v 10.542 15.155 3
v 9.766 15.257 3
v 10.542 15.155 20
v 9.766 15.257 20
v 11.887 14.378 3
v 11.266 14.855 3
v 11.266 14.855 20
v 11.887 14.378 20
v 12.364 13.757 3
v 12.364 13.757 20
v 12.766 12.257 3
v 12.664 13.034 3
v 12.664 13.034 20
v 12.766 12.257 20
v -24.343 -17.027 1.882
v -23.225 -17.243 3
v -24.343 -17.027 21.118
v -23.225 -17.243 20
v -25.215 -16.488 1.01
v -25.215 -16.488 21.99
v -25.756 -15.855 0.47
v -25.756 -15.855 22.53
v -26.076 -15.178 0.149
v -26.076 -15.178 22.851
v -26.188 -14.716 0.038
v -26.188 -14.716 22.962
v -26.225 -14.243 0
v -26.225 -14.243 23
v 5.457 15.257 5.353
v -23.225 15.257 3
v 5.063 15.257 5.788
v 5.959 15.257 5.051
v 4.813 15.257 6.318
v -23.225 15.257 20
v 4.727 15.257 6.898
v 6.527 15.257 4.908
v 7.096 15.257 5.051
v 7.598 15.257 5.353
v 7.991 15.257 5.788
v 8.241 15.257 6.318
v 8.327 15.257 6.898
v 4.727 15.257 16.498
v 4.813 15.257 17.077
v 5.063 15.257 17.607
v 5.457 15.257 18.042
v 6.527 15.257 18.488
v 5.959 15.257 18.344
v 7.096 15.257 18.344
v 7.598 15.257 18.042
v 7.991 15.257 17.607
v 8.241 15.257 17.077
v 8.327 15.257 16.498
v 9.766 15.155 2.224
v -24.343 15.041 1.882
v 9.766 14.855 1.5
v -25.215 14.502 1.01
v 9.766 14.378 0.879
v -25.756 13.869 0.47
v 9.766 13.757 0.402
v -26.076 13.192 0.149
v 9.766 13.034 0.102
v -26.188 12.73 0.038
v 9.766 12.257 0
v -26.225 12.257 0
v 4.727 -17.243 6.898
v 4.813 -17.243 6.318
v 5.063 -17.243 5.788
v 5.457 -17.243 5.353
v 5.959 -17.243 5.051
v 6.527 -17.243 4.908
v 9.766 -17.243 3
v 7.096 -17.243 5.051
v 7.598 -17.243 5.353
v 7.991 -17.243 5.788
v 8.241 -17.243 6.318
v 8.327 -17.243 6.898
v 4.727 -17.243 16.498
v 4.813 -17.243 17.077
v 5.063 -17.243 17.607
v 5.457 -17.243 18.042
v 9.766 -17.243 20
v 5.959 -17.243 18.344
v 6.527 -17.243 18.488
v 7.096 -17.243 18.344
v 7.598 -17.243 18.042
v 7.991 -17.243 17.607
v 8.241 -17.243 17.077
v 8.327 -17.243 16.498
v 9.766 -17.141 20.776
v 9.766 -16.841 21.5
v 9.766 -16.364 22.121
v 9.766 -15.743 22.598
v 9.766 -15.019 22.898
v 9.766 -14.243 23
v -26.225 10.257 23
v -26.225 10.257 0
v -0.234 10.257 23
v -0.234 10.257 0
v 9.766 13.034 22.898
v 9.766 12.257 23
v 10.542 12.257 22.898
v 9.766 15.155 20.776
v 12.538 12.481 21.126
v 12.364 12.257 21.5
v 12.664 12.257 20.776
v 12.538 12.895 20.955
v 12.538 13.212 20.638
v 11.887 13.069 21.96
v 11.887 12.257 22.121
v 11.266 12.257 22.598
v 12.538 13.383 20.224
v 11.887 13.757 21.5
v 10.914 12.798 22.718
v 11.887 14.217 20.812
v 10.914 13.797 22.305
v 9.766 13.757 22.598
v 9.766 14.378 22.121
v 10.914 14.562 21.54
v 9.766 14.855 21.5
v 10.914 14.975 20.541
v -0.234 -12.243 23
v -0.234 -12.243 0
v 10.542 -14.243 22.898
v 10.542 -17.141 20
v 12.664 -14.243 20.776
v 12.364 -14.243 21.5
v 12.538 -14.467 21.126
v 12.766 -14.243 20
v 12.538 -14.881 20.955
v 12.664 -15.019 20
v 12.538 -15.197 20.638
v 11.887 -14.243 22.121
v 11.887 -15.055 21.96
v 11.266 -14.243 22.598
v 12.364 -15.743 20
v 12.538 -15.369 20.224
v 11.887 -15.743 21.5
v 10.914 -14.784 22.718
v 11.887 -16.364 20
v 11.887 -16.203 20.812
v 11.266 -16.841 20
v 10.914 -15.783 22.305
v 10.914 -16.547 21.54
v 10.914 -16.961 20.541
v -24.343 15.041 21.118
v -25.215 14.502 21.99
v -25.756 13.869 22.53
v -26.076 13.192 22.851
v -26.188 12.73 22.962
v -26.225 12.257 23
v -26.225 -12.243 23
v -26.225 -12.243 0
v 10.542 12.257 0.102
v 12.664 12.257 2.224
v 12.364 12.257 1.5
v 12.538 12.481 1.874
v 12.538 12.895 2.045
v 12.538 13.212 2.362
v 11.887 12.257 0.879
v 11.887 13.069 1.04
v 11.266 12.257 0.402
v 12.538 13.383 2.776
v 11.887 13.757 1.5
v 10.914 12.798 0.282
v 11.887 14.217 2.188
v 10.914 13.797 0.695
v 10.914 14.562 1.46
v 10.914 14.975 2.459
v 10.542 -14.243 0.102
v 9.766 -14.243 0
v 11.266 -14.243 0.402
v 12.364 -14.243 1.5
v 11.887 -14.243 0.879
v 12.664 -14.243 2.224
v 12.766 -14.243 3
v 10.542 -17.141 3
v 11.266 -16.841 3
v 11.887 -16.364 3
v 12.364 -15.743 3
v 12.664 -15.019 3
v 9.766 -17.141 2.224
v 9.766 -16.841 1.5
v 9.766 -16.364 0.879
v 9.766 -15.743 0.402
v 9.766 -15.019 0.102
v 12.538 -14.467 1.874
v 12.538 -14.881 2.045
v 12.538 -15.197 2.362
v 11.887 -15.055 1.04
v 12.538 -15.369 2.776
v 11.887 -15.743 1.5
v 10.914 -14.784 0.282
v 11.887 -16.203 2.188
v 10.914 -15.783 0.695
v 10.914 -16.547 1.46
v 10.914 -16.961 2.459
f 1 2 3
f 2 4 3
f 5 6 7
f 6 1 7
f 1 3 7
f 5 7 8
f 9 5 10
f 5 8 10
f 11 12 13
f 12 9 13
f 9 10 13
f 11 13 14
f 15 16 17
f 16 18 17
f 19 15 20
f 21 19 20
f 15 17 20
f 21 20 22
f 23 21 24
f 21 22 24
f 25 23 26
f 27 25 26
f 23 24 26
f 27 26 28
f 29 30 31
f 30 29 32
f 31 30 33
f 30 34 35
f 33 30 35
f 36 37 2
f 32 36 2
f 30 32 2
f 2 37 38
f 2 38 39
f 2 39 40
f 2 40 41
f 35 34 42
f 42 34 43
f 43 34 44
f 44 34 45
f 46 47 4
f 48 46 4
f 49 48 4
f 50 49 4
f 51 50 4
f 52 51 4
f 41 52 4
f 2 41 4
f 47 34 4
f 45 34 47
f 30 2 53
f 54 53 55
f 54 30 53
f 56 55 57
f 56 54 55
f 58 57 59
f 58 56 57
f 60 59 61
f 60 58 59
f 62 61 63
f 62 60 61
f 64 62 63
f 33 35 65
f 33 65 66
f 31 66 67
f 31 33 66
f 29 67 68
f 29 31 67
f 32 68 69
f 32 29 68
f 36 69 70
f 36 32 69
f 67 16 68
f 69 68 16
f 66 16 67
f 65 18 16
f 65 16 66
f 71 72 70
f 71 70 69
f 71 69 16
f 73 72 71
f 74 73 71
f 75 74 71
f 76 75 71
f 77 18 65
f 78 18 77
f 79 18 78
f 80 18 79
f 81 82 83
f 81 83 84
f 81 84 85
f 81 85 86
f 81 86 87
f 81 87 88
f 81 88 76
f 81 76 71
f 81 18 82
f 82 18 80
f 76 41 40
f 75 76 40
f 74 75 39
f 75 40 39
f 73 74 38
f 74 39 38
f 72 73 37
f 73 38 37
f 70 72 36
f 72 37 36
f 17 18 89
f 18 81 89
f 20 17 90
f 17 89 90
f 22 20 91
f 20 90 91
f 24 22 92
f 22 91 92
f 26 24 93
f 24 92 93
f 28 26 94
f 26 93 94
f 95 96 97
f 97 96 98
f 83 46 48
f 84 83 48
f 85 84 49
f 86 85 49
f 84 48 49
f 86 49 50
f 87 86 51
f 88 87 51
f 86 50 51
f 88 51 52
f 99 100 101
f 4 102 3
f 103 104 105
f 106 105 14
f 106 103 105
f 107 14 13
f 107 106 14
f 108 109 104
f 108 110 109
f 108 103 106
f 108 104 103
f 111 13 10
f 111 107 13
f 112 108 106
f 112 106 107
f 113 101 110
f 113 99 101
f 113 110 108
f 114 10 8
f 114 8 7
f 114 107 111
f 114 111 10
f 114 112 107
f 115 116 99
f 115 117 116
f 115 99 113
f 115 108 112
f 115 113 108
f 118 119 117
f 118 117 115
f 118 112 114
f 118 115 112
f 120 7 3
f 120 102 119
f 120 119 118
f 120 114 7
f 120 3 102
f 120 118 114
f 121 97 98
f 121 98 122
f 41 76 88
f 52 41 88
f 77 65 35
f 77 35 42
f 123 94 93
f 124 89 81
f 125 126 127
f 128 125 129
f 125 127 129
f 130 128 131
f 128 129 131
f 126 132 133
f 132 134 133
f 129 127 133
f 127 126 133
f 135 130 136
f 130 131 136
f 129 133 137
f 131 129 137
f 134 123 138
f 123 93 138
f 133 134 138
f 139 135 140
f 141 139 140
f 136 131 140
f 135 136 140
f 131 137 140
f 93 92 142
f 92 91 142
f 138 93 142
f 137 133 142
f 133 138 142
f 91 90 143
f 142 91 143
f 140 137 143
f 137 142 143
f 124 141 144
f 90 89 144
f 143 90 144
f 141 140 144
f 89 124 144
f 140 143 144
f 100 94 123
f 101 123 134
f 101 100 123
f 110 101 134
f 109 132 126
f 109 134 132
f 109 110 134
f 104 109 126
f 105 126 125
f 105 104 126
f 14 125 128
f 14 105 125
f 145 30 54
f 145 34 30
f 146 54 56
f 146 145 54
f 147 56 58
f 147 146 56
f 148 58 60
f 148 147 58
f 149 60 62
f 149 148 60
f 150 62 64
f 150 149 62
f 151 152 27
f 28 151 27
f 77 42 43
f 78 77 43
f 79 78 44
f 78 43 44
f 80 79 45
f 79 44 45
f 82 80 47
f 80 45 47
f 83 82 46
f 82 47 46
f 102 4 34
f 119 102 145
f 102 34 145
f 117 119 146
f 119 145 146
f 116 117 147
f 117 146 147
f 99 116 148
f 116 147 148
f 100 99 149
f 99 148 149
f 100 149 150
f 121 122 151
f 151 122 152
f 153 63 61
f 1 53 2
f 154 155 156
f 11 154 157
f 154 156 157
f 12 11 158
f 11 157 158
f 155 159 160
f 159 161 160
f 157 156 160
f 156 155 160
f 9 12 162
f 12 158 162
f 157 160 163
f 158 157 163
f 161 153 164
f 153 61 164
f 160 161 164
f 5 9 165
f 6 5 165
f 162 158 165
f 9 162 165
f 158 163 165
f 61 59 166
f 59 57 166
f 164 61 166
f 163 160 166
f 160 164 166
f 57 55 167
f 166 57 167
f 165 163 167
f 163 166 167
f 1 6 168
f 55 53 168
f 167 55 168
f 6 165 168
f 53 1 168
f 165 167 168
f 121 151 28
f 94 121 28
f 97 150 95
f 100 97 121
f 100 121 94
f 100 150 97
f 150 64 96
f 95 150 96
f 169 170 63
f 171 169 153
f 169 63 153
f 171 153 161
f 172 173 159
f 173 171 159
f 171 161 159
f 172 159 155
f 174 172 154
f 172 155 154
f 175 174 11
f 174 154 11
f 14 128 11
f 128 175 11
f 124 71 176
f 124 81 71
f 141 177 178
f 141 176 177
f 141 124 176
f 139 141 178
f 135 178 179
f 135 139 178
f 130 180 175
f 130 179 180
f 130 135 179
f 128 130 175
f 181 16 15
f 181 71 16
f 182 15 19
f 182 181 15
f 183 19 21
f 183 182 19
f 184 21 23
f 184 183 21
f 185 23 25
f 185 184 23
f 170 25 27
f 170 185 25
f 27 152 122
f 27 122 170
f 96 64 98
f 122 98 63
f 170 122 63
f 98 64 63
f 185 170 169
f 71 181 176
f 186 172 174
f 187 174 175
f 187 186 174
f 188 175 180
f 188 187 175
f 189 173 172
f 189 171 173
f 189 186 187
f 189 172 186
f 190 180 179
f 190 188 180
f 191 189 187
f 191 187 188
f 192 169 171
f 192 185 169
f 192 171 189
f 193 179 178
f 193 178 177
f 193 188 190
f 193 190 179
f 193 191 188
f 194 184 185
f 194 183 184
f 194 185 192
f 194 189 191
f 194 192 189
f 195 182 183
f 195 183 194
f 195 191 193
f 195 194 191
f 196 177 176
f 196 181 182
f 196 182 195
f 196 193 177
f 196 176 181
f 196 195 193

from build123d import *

# Parameters (mm, degrees)
F1_DEPTH    = 23
F2_W        = 3.6
F2_H        = 13.6
F3_DEPTH    = 48.7
F4_T1_DEPTH = 32.5
F5_R        = 3


# Not quite as in the source:
# - a fillet or chamfer that OpenCascade refuses, or shapes differently, is made with other operations: its cross-section is extruded or revolved along the edge and cut away or added


with BuildPart() as f1:
    # F0 (on Top) → F1 (new body)
    with BuildSketch(Plane.XY):
        Polygon((12.7659387215, -17.2428843321), (12.7659387215, 15.2571156679), (-26.2254474751, 15.2571156679), (-26.2254474751, 10.2571156679), (-0.2340612785, 10.2571156679), (-0.2340612785, -12.2428843321), (-26.2254474751, -12.2428843321), (-26.2254474751, -17.2428843321), align=None)
    extrude(amount=F1_DEPTH)

    # F2 (on face) → F3 (cut)
    with BuildSketch(Plane.XZ.offset(17.2428843321)):
        with Locations((6.5272997685, 11.6975279525)):
            Rectangle(F2_W, F2_H)
    extrude(amount=-F3_DEPTH, mode=Mode.SUBTRACT)

    # F4: fillet of radius 2 on 4 edges, made by hand

    # F4_s2 → F4_t1 (join)
    with BuildSketch(Plane.XZ.offset(-15.2571156679)):
        with BuildLine():
            ThreePointArc((4.7272997685, 16.4975279525), (5.3130862061, 17.9117415149), (6.7272997685, 18.4975279525))
            Line((6.7272997685, 18.4975279525), (4.7272997685, 18.4975279525))
            Line((4.7272997685, 18.4975279525), (4.7272997685, 16.4975279525))
        make_face()
        with BuildLine():
            ThreePointArc((4.7272997685, 6.8975279525), (5.3130862061, 5.4833143901), (6.7272997685, 4.8975279525))
            Line((6.7272997685, 4.8975279525), (4.7272997685, 4.8975279525))
            Line((4.7272997685, 4.8975279525), (4.7272997685, 6.8975279525))
        make_face()
        with BuildLine():
            ThreePointArc((6.3272997685, 18.4975279525), (7.7415133308, 17.9117415149), (8.3272997685, 16.4975279525))
            Line((8.3272997685, 16.4975279525), (8.3272997685, 18.4975279525))
            Line((8.3272997685, 18.4975279525), (6.3272997685, 18.4975279525))
        make_face()
        with BuildLine():
            ThreePointArc((8.3272997685, 6.8975279525), (7.7415133308, 5.4833143901), (6.3272997685, 4.8975279525))
            Line((6.3272997685, 4.8975279525), (8.3272997685, 4.8975279525))
            Line((8.3272997685, 4.8975279525), (8.3272997685, 6.8975279525))
        make_face()
    extrude(amount=F4_T1_DEPTH)

    # F5
    f5_edges = [f1.edges().sort_by_distance(p)[0] for p in [
        (-6.729754, 15.257116, 0),
        (-26.225447, 15.257116, 11.5),
        (-6.729754, 15.257116, 23),
        (-6.729754, -17.242884, 23),
        (12.765939, -0.992884, 23),
        (-6.729754, -17.242884, 0),
        (12.765939, -0.992884, 0),
        (12.765939, -17.242884, 11.5),
        (12.765939, 15.257116, 11.5),
        (-26.225447, -17.242884, 11.5),
    ]]
    fillet(f5_edges, radius=F5_R)


solid = f1.part
